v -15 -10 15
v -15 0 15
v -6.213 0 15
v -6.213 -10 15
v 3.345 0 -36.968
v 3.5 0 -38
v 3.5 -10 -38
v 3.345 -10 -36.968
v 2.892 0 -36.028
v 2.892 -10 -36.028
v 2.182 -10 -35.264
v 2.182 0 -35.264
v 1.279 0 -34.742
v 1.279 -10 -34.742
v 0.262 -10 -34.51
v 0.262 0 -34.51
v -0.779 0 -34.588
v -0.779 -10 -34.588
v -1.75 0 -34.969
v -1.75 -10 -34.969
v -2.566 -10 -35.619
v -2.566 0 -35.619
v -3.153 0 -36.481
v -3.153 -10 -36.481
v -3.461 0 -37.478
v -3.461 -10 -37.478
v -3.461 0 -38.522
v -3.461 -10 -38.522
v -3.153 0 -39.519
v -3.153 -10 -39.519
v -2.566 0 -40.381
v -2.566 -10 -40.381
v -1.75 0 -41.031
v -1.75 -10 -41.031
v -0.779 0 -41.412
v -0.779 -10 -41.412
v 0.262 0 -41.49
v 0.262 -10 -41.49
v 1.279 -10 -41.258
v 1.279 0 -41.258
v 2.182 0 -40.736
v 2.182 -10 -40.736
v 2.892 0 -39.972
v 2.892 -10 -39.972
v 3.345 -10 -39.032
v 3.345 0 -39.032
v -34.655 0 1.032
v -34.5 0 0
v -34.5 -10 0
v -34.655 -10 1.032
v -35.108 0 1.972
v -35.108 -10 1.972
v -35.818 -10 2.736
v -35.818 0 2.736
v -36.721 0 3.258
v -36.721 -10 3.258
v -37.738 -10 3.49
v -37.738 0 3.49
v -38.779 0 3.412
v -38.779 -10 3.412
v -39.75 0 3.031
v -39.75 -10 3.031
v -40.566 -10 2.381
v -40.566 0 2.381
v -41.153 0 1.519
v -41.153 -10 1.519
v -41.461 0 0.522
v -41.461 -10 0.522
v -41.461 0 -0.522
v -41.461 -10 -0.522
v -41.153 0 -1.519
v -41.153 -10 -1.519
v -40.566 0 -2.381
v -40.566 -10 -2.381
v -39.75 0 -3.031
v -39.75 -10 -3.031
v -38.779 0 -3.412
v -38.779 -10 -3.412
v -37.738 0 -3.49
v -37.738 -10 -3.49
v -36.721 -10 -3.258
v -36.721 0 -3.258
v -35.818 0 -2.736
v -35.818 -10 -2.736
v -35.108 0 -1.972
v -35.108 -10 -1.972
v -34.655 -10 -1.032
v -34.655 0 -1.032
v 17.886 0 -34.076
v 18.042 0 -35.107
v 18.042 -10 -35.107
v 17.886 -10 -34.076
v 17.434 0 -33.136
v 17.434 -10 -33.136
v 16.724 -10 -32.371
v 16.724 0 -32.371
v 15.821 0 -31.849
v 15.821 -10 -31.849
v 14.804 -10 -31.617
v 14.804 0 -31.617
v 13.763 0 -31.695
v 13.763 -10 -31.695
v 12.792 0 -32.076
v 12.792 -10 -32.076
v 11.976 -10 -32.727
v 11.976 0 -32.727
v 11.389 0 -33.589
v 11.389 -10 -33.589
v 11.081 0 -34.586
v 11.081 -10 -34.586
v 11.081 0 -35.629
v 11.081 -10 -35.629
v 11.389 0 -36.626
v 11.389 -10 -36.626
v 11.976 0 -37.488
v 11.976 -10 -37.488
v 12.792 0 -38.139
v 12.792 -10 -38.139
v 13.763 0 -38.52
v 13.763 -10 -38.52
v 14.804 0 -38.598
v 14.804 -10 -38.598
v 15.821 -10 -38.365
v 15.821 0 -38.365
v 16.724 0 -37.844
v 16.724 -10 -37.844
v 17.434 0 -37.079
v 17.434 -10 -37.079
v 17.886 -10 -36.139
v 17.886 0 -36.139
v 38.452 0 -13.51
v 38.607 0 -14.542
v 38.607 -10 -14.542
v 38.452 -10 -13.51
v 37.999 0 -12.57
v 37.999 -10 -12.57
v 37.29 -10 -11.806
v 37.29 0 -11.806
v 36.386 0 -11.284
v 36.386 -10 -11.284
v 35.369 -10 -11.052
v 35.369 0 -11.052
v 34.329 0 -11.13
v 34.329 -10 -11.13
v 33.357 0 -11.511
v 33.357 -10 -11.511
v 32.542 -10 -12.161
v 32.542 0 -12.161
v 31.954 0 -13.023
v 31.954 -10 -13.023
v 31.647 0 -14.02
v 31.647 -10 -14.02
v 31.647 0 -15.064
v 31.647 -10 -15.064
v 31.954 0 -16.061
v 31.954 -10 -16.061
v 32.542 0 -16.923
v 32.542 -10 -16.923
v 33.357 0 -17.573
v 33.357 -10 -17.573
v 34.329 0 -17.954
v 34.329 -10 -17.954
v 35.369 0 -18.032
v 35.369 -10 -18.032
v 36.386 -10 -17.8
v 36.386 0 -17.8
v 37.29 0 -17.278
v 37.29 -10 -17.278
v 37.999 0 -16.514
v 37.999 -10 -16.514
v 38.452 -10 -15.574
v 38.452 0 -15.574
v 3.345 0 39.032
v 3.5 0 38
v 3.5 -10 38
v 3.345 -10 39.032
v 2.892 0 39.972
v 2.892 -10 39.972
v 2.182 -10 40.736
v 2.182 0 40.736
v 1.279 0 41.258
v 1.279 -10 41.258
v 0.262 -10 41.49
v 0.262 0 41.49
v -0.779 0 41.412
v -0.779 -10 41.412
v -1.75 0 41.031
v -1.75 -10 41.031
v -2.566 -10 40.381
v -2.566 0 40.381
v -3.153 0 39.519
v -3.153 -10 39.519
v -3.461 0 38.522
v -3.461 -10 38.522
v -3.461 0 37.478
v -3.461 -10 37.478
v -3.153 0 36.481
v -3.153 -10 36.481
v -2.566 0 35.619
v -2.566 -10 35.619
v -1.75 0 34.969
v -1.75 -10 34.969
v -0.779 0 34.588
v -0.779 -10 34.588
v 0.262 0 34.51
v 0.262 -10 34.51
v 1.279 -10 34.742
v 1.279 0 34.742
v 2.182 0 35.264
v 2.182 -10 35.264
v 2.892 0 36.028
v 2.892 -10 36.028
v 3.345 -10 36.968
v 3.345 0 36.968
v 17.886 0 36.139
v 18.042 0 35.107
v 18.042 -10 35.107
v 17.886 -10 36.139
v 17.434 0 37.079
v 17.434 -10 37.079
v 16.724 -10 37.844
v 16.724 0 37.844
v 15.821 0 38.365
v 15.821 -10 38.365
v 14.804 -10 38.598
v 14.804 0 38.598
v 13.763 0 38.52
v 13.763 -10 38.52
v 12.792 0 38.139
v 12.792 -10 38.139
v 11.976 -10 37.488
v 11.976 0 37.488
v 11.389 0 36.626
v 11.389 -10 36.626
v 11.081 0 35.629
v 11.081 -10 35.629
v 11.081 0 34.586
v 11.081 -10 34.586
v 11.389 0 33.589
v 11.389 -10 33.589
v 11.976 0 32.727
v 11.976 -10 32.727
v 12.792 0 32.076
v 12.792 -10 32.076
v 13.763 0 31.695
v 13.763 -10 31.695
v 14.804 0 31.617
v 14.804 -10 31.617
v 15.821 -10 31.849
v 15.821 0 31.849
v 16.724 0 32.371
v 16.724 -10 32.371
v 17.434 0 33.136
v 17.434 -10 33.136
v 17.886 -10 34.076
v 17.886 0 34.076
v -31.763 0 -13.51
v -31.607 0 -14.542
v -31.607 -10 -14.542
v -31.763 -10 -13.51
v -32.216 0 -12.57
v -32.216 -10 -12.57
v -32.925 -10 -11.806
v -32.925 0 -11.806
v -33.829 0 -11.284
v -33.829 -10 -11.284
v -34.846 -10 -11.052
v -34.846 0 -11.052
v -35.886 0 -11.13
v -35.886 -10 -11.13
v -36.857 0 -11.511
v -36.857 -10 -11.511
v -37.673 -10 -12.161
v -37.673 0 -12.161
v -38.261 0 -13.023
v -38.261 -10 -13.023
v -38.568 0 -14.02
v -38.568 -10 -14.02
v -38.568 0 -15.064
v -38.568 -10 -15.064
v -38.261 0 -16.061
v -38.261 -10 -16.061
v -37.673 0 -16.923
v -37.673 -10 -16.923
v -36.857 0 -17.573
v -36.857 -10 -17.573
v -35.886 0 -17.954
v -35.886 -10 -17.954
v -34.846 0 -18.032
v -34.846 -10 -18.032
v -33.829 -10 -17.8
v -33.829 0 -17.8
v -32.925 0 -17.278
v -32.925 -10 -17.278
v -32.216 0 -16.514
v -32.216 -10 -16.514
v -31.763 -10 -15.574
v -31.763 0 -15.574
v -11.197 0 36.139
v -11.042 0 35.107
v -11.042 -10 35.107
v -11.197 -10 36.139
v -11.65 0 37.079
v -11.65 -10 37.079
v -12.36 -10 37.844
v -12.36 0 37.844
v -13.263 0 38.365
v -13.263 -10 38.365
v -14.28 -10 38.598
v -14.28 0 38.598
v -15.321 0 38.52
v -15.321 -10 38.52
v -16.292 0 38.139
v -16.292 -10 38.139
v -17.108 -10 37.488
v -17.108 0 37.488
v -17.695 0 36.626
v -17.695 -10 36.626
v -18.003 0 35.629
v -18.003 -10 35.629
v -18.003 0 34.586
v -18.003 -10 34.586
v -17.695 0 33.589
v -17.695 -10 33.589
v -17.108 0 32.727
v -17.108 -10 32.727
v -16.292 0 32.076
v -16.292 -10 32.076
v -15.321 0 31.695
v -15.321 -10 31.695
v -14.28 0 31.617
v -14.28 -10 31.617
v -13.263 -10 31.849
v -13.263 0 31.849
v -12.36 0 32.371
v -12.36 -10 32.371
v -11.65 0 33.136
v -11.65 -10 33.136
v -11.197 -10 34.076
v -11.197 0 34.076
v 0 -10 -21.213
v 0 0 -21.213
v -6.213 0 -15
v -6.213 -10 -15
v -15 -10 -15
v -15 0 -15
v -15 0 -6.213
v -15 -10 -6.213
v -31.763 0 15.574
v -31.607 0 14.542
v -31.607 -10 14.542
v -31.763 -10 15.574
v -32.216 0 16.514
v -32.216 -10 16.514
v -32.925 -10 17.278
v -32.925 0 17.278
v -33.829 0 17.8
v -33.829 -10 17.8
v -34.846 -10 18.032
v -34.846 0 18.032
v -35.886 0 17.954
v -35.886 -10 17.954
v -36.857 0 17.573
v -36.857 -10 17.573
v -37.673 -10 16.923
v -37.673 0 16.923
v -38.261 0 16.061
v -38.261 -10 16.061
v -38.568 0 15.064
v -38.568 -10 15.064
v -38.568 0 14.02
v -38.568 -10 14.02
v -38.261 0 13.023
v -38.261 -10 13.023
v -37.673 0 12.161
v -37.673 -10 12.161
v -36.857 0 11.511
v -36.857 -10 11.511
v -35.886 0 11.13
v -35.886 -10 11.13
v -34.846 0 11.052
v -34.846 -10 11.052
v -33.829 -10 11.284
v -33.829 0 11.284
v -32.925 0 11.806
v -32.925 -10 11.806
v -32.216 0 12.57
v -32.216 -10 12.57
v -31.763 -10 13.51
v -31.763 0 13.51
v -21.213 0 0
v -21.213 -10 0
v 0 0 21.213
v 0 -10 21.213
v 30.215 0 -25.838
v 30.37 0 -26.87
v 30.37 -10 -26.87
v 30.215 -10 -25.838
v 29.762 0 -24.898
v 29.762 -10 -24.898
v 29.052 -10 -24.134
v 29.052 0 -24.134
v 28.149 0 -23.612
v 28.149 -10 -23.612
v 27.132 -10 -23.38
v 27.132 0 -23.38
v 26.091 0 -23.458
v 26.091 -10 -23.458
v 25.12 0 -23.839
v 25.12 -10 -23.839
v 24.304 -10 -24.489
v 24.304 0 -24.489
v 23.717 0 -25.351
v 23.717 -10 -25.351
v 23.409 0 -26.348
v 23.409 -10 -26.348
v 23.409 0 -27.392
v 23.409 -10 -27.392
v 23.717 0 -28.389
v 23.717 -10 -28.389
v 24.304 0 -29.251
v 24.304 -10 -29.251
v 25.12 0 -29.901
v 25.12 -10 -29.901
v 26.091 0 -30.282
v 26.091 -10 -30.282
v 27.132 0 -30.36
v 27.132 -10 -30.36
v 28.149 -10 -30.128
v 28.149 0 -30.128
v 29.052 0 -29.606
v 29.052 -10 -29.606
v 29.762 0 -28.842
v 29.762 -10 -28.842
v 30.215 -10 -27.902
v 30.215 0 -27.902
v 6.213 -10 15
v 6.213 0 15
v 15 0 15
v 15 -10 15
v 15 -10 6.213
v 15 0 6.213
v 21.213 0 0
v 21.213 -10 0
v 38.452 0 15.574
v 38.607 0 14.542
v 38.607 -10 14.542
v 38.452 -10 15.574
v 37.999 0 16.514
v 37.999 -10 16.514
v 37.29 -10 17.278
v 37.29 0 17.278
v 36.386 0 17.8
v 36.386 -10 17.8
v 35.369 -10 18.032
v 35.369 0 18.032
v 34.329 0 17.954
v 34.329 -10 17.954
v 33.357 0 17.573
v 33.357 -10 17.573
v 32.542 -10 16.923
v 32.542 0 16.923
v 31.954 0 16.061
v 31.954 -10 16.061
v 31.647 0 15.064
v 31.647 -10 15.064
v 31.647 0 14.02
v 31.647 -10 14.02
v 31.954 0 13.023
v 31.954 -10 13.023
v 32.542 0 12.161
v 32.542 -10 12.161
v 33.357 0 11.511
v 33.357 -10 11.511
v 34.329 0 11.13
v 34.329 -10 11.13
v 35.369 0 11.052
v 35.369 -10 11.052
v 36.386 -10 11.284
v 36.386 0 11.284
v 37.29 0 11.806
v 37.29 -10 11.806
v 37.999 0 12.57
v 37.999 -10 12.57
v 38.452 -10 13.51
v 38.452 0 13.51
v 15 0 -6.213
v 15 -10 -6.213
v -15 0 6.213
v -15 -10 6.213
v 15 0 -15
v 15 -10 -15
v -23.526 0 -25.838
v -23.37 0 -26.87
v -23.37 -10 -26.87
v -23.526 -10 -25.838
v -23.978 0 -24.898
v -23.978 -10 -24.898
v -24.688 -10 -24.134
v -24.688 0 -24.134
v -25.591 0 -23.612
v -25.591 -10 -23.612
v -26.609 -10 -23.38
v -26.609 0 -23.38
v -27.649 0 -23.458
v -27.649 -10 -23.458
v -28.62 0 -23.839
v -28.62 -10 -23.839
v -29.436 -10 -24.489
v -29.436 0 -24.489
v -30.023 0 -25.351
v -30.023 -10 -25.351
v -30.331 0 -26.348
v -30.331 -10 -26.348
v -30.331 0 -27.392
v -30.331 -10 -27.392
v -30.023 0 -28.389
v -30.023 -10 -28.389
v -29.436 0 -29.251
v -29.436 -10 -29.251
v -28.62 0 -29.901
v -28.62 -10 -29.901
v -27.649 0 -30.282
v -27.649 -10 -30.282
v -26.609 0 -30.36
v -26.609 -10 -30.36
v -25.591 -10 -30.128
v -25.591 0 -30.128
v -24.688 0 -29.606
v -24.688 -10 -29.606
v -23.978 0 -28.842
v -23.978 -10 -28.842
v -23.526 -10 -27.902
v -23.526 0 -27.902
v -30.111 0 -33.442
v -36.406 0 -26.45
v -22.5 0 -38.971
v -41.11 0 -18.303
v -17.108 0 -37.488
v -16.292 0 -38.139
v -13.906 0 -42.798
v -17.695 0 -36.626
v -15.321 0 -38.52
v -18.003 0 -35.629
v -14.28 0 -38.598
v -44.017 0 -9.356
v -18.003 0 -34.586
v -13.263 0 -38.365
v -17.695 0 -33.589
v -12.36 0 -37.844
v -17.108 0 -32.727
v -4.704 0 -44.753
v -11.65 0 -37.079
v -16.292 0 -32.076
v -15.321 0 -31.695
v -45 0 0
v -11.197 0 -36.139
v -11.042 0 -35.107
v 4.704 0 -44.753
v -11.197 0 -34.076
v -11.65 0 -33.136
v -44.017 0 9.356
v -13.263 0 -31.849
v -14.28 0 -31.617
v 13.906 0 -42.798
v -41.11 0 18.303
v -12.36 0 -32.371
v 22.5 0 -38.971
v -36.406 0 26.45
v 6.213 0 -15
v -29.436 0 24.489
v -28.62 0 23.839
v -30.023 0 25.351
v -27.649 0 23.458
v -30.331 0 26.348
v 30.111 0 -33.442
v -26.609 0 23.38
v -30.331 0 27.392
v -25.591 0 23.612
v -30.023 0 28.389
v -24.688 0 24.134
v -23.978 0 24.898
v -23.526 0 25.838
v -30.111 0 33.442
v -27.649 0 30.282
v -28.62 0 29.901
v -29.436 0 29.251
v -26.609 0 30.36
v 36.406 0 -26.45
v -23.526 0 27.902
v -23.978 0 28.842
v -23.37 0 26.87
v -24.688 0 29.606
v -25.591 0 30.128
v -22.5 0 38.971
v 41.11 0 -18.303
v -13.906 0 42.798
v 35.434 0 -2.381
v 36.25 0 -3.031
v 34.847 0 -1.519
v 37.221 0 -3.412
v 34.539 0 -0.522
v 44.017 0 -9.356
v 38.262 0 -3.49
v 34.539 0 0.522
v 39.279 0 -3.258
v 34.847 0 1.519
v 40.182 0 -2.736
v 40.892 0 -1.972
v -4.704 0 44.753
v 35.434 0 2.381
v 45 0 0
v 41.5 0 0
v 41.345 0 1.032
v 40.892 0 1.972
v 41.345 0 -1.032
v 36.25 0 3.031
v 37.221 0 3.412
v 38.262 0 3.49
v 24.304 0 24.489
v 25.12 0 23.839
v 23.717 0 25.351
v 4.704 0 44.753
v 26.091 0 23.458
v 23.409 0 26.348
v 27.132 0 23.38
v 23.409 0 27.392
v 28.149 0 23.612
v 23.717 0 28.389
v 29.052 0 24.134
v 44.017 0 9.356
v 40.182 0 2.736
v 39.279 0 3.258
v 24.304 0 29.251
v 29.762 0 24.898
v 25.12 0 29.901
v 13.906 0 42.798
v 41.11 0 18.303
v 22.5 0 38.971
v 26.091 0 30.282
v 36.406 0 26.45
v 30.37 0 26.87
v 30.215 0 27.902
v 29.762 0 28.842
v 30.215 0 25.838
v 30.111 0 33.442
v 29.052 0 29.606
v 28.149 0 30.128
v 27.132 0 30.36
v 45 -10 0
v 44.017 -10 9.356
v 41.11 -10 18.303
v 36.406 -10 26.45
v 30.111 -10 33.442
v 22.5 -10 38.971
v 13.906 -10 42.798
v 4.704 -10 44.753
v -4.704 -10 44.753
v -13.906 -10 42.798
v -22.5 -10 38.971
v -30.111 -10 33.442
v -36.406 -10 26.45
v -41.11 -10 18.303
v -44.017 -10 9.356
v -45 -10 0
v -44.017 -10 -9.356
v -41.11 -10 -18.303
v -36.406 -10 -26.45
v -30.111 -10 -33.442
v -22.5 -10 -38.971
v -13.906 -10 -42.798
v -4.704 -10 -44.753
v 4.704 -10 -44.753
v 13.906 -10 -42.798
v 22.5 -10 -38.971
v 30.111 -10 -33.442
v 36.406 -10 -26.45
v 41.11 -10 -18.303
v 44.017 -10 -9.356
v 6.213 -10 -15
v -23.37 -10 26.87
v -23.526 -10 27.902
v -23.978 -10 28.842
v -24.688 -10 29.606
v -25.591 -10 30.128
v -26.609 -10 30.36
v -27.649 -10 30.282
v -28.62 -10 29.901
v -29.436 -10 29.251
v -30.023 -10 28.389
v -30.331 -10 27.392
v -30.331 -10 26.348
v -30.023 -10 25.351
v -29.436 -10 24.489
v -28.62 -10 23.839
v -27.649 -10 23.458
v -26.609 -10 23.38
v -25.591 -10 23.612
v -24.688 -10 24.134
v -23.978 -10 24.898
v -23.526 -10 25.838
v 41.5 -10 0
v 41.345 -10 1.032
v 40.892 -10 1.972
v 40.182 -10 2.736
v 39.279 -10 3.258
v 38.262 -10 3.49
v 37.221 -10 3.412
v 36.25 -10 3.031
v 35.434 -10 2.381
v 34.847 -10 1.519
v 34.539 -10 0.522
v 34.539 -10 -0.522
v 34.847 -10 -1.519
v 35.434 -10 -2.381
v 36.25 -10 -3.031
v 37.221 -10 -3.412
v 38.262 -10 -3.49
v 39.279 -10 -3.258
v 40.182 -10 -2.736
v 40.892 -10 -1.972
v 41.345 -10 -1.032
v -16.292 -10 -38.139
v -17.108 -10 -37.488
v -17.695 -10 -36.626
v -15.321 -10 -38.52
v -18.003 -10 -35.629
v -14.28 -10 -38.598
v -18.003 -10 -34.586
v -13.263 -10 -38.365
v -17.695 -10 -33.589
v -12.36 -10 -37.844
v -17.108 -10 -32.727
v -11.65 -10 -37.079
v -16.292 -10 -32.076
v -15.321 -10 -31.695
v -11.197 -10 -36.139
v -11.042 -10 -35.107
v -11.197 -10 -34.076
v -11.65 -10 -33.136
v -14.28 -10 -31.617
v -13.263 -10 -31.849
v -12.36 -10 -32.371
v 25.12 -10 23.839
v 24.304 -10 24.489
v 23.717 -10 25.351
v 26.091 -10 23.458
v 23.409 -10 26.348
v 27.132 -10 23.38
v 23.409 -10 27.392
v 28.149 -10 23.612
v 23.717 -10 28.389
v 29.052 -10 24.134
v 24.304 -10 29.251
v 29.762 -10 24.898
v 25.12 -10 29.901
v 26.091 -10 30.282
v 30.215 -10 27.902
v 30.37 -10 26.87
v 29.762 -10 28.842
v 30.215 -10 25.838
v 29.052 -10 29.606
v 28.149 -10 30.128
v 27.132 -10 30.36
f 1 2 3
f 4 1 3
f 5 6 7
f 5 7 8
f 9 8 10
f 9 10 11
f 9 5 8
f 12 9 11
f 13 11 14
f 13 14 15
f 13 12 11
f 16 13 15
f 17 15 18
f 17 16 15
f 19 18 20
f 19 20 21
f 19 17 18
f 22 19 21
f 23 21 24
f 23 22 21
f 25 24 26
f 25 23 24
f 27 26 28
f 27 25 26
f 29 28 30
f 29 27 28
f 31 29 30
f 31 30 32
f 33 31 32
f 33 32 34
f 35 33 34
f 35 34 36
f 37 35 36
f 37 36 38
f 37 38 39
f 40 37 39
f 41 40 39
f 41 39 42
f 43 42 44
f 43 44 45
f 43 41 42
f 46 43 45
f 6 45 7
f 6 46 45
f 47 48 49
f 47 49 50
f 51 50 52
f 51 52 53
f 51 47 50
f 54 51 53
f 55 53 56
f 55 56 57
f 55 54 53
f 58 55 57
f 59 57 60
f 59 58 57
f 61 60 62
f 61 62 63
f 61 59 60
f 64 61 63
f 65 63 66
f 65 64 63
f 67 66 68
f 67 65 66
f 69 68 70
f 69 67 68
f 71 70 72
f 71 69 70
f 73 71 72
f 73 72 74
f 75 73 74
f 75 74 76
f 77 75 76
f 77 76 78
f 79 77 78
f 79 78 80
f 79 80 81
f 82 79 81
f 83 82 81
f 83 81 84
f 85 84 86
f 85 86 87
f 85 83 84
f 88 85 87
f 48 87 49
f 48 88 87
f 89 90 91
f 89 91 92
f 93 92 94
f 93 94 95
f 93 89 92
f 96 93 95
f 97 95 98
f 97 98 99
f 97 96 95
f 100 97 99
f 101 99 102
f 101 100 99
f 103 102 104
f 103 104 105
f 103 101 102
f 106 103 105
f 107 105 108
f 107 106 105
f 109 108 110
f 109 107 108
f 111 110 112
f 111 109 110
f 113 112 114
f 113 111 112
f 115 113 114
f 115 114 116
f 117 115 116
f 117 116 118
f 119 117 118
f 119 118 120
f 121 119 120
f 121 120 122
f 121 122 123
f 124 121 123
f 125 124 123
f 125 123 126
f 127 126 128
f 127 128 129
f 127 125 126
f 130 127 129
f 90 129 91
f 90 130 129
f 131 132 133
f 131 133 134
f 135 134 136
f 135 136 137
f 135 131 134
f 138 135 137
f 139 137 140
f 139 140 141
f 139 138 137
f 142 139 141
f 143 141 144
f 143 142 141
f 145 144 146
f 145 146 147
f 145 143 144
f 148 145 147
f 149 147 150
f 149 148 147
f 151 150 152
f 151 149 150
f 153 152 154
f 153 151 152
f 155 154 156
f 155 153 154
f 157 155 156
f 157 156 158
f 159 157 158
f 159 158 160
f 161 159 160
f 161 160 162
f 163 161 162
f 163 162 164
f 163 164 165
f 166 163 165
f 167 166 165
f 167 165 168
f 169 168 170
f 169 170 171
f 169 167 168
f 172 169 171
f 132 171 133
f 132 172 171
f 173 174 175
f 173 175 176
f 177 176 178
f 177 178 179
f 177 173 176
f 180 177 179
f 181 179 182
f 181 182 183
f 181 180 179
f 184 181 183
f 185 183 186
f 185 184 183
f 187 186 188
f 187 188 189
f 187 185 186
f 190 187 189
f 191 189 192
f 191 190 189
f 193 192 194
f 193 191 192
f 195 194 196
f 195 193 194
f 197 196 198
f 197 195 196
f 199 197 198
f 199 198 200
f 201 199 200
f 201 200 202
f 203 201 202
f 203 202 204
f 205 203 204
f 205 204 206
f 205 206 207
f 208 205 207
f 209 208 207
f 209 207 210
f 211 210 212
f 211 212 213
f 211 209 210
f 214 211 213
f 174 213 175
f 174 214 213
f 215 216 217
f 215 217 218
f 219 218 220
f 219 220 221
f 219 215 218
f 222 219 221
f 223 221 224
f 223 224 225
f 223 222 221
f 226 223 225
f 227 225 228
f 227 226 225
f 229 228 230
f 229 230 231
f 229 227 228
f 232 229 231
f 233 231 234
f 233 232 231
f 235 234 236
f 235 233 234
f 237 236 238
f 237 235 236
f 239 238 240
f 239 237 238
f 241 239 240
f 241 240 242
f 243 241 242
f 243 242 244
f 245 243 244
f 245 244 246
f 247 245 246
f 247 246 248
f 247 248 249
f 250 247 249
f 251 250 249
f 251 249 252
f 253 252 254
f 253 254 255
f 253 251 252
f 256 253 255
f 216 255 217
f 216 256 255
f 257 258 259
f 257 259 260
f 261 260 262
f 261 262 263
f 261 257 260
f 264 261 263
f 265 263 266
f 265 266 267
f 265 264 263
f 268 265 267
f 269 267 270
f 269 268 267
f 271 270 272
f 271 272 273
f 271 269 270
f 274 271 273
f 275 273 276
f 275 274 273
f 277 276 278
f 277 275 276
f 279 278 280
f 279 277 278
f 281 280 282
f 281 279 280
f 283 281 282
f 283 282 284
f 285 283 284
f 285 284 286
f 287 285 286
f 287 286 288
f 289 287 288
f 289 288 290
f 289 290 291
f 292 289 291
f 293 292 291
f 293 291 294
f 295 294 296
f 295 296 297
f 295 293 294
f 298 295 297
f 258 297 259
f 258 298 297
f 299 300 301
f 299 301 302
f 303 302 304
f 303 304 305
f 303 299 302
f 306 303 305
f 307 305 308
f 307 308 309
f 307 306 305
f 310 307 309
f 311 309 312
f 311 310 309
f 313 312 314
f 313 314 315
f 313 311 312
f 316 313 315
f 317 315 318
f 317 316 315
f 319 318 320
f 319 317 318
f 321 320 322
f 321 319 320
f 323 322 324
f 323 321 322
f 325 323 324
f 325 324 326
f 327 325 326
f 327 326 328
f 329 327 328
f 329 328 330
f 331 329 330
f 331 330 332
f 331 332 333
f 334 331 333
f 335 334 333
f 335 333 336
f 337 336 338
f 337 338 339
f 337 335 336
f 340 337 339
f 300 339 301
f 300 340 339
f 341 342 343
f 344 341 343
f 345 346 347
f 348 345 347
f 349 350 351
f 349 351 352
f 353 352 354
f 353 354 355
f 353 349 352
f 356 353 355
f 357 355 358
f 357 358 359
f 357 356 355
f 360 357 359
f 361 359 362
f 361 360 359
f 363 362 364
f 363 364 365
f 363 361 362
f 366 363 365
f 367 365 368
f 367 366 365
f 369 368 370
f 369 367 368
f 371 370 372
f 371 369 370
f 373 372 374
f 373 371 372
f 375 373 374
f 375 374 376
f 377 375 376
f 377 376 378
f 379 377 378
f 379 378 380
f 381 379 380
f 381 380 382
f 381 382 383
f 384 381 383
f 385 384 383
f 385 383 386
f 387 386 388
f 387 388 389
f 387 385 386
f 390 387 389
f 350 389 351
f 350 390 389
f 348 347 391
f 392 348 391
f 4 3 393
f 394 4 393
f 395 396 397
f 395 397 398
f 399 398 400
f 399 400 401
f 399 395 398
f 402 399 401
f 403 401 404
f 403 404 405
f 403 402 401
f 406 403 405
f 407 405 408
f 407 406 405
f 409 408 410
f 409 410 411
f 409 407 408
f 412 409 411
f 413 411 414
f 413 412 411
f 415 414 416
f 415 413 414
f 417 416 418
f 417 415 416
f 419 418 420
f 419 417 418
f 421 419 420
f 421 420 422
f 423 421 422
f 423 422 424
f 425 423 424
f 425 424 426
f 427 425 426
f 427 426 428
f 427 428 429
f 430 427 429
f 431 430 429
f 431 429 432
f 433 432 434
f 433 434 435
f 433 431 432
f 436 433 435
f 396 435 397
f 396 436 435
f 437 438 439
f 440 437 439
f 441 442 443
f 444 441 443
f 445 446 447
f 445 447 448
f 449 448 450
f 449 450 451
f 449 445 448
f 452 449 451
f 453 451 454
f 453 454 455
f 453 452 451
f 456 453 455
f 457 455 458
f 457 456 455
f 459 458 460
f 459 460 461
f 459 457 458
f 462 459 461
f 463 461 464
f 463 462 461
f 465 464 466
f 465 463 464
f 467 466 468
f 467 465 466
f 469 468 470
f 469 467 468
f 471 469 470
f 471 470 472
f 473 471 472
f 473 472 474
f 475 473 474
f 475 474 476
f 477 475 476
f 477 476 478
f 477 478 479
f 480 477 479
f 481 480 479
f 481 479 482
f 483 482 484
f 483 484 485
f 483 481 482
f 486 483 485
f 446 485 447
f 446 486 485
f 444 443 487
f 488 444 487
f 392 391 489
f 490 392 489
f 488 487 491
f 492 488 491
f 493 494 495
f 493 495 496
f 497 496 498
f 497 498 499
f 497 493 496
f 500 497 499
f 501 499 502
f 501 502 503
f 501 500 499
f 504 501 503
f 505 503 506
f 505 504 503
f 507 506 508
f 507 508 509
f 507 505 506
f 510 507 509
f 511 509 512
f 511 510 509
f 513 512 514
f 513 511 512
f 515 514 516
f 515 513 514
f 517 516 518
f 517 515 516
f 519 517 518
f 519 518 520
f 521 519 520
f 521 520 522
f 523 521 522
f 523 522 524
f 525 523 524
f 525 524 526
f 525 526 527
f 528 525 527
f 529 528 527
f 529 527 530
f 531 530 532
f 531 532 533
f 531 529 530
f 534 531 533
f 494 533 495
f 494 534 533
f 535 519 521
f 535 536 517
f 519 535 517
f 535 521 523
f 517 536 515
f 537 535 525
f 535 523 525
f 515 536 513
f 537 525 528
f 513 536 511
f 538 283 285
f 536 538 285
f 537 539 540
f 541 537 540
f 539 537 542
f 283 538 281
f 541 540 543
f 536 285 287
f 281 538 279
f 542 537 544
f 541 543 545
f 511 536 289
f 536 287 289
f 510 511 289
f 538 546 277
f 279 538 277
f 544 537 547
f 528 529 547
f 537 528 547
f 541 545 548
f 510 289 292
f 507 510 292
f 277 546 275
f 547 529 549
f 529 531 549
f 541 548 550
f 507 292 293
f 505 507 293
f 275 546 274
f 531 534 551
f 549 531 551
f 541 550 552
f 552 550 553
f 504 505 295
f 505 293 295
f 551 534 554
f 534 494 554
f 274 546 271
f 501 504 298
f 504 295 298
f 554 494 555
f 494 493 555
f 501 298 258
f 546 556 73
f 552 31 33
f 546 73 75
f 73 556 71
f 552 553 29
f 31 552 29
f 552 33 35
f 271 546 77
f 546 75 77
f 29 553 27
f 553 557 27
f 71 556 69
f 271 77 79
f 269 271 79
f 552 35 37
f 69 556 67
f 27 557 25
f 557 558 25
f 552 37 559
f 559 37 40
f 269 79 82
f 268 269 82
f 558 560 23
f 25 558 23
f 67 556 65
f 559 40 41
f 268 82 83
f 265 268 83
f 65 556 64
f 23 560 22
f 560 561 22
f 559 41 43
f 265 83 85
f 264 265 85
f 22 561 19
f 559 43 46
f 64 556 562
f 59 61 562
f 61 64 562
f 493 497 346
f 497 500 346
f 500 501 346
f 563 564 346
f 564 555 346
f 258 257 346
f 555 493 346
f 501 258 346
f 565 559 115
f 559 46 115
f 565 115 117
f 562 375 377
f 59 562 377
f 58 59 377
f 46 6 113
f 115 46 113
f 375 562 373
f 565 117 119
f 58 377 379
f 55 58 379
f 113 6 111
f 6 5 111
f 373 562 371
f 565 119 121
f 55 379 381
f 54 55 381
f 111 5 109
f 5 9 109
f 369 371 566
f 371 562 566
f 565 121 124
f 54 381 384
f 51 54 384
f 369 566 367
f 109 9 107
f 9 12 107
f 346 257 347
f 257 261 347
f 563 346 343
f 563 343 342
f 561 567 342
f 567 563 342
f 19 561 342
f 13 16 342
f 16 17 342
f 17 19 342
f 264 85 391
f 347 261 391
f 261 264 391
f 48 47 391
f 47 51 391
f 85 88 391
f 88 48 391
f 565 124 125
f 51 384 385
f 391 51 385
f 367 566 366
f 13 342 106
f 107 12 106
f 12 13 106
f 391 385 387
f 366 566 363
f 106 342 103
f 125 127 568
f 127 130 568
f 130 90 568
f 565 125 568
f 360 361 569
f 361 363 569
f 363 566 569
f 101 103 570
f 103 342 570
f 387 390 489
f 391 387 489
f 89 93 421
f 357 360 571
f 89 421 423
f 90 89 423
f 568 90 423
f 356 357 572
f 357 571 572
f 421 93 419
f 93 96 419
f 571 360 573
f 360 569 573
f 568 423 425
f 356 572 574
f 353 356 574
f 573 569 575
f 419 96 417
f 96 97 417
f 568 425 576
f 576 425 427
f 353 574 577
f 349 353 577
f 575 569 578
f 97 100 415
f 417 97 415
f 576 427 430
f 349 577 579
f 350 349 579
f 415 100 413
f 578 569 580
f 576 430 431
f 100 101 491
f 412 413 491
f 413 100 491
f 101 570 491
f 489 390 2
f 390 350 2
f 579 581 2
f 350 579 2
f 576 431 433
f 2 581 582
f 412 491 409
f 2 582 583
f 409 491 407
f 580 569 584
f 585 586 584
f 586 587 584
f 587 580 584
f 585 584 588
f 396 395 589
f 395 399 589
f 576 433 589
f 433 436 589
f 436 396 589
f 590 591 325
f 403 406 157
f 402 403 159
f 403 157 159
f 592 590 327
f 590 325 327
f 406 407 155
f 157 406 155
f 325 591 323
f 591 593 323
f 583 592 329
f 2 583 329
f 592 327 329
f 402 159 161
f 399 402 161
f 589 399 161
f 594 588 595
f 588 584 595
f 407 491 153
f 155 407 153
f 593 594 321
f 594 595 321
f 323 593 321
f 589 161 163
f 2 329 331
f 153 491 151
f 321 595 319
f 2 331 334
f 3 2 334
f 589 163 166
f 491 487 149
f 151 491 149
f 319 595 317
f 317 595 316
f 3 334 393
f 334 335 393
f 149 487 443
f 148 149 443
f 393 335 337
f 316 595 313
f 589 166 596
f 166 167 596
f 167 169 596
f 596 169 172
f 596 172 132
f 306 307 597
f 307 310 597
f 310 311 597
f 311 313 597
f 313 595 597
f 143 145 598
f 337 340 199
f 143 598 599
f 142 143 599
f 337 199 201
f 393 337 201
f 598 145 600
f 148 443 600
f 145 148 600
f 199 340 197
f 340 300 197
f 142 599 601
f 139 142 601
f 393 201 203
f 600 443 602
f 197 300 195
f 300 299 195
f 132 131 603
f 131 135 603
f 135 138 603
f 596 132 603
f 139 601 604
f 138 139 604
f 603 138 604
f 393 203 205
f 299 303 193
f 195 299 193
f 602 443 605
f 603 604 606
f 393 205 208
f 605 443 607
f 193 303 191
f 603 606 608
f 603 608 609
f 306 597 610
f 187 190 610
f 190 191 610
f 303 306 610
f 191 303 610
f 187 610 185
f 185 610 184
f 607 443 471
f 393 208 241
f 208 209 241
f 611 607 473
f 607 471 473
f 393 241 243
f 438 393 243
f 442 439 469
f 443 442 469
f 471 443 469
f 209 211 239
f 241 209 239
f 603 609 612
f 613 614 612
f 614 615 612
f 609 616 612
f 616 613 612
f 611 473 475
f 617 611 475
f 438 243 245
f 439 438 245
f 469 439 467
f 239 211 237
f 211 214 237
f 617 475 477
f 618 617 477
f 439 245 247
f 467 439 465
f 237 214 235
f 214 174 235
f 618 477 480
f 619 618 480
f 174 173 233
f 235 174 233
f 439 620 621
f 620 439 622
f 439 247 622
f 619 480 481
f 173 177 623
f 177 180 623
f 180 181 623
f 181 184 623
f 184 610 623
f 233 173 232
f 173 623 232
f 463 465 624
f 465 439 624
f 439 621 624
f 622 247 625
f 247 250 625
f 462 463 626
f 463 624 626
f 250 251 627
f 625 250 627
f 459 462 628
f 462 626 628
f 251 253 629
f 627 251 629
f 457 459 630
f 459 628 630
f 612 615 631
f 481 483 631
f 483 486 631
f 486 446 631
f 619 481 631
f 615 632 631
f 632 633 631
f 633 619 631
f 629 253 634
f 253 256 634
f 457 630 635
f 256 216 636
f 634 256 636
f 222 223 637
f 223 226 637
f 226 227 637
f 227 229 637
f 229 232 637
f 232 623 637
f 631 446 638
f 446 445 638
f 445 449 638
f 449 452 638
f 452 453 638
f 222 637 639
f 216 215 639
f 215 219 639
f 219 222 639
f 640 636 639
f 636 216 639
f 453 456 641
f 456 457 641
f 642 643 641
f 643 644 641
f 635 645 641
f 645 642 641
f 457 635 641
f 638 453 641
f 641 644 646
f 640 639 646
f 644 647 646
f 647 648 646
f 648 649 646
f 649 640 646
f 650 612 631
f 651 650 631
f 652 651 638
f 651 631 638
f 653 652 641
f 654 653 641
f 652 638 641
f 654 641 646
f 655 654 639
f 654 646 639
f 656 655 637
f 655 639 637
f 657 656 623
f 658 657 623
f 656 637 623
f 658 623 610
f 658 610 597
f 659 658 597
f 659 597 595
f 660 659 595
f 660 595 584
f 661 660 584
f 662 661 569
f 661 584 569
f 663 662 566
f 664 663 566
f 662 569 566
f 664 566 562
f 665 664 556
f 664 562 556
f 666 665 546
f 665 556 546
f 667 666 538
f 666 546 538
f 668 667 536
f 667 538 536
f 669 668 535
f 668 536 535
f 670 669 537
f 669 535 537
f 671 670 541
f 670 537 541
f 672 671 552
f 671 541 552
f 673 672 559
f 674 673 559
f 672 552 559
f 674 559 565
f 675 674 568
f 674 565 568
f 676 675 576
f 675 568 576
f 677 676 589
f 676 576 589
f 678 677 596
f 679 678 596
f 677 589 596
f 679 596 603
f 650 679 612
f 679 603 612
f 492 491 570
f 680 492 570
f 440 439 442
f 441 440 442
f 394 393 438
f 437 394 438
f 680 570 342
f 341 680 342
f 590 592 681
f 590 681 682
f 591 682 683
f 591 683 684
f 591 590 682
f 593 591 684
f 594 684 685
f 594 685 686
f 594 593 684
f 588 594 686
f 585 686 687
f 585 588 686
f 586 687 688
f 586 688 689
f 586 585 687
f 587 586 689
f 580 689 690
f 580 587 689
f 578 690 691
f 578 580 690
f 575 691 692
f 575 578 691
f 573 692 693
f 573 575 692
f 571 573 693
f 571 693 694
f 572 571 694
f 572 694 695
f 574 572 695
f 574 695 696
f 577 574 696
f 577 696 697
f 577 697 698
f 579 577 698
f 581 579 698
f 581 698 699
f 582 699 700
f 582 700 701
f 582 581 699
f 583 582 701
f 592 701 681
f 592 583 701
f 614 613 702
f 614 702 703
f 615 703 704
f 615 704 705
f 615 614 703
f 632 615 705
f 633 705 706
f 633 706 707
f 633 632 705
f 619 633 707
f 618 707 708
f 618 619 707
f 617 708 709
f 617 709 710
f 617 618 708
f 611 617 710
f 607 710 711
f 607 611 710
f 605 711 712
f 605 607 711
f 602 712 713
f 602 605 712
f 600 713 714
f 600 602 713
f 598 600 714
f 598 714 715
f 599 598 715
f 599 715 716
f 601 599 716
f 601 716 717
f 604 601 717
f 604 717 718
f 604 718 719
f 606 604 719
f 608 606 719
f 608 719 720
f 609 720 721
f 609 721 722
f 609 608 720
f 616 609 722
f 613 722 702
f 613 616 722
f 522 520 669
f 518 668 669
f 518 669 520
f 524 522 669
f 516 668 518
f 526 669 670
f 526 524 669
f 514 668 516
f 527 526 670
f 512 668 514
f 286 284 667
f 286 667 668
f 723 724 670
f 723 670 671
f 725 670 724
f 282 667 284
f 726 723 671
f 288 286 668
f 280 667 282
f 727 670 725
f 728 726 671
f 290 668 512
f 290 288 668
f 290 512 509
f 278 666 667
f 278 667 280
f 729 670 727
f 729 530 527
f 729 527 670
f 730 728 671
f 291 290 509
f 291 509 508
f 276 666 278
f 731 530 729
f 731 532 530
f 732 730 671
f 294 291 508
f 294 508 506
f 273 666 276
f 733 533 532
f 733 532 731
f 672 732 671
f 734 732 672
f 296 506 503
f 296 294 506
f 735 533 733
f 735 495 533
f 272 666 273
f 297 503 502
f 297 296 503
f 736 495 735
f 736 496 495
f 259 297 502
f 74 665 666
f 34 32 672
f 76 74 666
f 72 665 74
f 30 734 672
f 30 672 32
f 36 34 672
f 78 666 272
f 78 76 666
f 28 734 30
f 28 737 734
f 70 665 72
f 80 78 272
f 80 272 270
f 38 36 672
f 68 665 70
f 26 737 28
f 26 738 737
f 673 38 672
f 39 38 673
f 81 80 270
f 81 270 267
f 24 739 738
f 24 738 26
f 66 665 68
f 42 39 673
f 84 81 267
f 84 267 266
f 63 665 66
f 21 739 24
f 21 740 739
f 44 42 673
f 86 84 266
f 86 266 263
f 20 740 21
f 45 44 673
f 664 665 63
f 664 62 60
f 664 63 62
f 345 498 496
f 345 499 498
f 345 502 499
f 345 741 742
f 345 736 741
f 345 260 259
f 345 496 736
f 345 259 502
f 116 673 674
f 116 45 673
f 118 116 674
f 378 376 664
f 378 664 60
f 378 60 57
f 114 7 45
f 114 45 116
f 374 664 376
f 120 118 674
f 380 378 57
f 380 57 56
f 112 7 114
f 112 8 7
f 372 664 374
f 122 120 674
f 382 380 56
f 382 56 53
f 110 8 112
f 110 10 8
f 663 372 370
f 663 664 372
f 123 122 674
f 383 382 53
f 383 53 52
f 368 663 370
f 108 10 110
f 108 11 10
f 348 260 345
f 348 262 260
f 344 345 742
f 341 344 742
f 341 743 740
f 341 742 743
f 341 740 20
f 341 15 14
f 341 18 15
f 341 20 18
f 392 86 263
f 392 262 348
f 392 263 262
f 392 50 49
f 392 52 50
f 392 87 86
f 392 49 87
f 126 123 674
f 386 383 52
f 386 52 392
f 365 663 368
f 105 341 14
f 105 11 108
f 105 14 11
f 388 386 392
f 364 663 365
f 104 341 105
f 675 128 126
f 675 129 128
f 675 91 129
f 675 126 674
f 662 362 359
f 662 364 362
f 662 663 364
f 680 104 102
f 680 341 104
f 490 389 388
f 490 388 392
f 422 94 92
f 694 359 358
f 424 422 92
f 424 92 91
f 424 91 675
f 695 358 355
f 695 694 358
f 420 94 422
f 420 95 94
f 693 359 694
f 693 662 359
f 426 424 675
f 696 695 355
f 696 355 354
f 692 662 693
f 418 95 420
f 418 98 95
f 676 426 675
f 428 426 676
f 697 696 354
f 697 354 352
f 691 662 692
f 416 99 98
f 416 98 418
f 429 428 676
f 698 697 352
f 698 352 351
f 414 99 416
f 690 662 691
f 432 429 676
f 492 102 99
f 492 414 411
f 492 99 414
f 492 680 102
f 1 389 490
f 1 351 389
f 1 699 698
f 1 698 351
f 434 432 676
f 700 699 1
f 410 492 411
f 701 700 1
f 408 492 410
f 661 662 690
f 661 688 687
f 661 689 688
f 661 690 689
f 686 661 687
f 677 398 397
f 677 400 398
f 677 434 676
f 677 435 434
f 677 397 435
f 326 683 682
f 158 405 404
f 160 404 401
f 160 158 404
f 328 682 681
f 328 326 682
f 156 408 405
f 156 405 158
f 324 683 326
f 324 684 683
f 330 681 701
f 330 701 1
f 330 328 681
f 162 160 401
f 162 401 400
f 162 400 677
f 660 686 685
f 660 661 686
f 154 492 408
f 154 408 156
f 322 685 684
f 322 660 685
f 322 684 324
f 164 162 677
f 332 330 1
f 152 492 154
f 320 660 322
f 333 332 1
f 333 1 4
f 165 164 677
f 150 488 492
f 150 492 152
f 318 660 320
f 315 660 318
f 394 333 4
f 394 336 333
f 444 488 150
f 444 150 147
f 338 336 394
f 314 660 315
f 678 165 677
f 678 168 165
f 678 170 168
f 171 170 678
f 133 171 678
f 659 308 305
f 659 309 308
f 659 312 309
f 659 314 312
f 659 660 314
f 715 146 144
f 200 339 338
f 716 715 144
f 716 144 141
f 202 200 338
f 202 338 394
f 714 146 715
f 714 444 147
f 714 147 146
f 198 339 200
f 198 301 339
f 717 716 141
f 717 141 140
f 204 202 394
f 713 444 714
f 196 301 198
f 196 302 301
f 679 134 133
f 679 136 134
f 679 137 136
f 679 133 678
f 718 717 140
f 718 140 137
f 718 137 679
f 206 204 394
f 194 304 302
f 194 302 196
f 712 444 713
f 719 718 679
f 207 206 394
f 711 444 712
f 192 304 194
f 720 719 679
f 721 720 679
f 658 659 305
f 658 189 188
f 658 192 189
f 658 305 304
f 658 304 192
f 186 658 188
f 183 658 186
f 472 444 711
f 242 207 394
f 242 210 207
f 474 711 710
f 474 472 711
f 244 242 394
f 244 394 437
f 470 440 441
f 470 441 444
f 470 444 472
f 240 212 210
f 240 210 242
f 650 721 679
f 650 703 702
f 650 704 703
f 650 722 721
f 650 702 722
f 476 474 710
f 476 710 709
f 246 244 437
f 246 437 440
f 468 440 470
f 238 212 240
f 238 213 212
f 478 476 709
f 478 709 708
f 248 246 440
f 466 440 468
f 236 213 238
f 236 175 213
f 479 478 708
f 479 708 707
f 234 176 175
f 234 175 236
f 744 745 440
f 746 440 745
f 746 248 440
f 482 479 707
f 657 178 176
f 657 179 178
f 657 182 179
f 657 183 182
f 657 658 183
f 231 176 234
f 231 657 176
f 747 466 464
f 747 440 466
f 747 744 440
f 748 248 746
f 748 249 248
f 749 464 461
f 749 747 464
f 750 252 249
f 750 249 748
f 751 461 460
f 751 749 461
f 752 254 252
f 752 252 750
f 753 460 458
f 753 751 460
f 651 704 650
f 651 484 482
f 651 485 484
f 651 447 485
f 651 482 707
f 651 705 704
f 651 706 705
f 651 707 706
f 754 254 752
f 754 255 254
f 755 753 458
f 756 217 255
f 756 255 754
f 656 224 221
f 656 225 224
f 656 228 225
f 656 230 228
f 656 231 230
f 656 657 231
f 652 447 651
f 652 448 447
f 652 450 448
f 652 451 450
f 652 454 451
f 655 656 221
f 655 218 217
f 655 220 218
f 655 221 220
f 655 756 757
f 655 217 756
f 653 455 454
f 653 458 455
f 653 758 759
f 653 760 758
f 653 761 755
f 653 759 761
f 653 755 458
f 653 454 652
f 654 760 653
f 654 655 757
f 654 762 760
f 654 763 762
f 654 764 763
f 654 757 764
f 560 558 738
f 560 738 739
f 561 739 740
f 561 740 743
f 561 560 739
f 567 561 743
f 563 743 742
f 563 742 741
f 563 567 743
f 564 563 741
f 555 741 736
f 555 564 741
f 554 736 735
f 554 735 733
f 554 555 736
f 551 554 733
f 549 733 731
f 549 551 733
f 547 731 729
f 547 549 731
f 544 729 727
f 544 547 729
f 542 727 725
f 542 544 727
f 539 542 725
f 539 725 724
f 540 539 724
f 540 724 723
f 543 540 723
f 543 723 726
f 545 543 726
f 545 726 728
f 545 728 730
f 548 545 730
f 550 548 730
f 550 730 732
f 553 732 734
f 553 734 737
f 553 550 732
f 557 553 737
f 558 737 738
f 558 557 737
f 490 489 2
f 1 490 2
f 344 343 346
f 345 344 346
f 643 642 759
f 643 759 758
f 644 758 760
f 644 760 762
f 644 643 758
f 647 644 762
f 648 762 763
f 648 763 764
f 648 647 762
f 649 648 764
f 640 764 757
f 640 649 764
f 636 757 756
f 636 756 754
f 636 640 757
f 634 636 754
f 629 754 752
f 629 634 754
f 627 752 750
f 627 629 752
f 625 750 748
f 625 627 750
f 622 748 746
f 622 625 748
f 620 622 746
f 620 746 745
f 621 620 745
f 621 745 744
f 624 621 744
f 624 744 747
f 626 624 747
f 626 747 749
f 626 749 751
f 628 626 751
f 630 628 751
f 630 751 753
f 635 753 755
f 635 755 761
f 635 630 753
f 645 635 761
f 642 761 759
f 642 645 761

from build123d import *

# Parameters (mm, degrees)
F0_R     = 45
F0_R_2   = 3.5
F1_DEPTH = 10


with BuildPart() as f1:
    # F0 (on Front) → F1 (new body)
    with BuildSketch(Plane.XZ):
        Circle(F0_R)
        with Locations((-26.870058, -26.870058)):
            Circle(F0_R_2, mode=Mode.SUBTRACT)
        with Locations((-14.54197, -35.107422)):
            Circle(F0_R_2, mode=Mode.SUBTRACT)
        with Locations((-35.107422, -14.54197)):
            Circle(F0_R_2, mode=Mode.SUBTRACT)
        with Locations((0, -38)):
            Circle(F0_R_2, mode=Mode.SUBTRACT)
        with Locations((14.54197, -35.107422)):
            Circle(F0_R_2, mode=Mode.SUBTRACT)
        with Locations((26.870058, -26.870058)):
            Circle(F0_R_2, mode=Mode.SUBTRACT)
        with Locations((35.107422, -14.54197)):
            Circle(F0_R_2, mode=Mode.SUBTRACT)
        with Locations((-38, 0)):
            Circle(F0_R_2, mode=Mode.SUBTRACT)
        with Locations((-35.107422, 14.54197)):
            Circle(F0_R_2, mode=Mode.SUBTRACT)
        with Locations((-26.870058, 26.870058)):
            Circle(F0_R_2, mode=Mode.SUBTRACT)
        with Locations((-14.54197, 35.107422)):
            Circle(F0_R_2, mode=Mode.SUBTRACT)
        Polygon((15, 6.213203), (21.213203, 0), (15, -6.213203), (15, -15), (6.213203, -15), (0, -21.213203), (-6.213203, -15), (-15, -15), (-15, -6.213203), (-21.213203, 0), (-15, 6.213203), (-15, 15), (-6.213203, 15), (0, 21.213203), (6.213203, 15), (15, 15), align=None, mode=Mode.SUBTRACT)
        with Locations((38, 0)):
            Circle(F0_R_2, mode=Mode.SUBTRACT)
        with Locations((35.107422, 14.54197)):
            Circle(F0_R_2, mode=Mode.SUBTRACT)
        with Locations((0, 38)):
            Circle(F0_R_2, mode=Mode.SUBTRACT)
        with Locations((14.54197, 35.107422)):
            Circle(F0_R_2, mode=Mode.SUBTRACT)
        with Locations((26.870058, 26.870058)):
            Circle(F0_R_2, mode=Mode.SUBTRACT)
    extrude(amount=F1_DEPTH)


solid = f1.part
